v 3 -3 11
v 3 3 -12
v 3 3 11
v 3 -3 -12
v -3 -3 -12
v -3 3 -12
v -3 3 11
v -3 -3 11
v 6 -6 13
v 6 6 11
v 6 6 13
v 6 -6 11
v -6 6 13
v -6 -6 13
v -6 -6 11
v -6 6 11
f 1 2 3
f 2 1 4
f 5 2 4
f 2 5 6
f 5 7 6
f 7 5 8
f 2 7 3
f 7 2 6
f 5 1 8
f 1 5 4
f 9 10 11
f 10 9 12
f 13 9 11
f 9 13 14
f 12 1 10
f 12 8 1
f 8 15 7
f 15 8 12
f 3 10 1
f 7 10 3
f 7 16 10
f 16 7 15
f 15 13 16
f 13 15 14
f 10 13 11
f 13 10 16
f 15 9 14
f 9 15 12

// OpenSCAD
// Z-up → Y-up check (plan §5.1). Strongly asymmetric along Z with a cap at the +Z top, so the
// up direction is visually unambiguous. After import the cap must sit on gcad's +Y.
cube([6, 6, 24], center = true);
translate([0, 0, 12]) cube([12, 12, 2], center = true);
